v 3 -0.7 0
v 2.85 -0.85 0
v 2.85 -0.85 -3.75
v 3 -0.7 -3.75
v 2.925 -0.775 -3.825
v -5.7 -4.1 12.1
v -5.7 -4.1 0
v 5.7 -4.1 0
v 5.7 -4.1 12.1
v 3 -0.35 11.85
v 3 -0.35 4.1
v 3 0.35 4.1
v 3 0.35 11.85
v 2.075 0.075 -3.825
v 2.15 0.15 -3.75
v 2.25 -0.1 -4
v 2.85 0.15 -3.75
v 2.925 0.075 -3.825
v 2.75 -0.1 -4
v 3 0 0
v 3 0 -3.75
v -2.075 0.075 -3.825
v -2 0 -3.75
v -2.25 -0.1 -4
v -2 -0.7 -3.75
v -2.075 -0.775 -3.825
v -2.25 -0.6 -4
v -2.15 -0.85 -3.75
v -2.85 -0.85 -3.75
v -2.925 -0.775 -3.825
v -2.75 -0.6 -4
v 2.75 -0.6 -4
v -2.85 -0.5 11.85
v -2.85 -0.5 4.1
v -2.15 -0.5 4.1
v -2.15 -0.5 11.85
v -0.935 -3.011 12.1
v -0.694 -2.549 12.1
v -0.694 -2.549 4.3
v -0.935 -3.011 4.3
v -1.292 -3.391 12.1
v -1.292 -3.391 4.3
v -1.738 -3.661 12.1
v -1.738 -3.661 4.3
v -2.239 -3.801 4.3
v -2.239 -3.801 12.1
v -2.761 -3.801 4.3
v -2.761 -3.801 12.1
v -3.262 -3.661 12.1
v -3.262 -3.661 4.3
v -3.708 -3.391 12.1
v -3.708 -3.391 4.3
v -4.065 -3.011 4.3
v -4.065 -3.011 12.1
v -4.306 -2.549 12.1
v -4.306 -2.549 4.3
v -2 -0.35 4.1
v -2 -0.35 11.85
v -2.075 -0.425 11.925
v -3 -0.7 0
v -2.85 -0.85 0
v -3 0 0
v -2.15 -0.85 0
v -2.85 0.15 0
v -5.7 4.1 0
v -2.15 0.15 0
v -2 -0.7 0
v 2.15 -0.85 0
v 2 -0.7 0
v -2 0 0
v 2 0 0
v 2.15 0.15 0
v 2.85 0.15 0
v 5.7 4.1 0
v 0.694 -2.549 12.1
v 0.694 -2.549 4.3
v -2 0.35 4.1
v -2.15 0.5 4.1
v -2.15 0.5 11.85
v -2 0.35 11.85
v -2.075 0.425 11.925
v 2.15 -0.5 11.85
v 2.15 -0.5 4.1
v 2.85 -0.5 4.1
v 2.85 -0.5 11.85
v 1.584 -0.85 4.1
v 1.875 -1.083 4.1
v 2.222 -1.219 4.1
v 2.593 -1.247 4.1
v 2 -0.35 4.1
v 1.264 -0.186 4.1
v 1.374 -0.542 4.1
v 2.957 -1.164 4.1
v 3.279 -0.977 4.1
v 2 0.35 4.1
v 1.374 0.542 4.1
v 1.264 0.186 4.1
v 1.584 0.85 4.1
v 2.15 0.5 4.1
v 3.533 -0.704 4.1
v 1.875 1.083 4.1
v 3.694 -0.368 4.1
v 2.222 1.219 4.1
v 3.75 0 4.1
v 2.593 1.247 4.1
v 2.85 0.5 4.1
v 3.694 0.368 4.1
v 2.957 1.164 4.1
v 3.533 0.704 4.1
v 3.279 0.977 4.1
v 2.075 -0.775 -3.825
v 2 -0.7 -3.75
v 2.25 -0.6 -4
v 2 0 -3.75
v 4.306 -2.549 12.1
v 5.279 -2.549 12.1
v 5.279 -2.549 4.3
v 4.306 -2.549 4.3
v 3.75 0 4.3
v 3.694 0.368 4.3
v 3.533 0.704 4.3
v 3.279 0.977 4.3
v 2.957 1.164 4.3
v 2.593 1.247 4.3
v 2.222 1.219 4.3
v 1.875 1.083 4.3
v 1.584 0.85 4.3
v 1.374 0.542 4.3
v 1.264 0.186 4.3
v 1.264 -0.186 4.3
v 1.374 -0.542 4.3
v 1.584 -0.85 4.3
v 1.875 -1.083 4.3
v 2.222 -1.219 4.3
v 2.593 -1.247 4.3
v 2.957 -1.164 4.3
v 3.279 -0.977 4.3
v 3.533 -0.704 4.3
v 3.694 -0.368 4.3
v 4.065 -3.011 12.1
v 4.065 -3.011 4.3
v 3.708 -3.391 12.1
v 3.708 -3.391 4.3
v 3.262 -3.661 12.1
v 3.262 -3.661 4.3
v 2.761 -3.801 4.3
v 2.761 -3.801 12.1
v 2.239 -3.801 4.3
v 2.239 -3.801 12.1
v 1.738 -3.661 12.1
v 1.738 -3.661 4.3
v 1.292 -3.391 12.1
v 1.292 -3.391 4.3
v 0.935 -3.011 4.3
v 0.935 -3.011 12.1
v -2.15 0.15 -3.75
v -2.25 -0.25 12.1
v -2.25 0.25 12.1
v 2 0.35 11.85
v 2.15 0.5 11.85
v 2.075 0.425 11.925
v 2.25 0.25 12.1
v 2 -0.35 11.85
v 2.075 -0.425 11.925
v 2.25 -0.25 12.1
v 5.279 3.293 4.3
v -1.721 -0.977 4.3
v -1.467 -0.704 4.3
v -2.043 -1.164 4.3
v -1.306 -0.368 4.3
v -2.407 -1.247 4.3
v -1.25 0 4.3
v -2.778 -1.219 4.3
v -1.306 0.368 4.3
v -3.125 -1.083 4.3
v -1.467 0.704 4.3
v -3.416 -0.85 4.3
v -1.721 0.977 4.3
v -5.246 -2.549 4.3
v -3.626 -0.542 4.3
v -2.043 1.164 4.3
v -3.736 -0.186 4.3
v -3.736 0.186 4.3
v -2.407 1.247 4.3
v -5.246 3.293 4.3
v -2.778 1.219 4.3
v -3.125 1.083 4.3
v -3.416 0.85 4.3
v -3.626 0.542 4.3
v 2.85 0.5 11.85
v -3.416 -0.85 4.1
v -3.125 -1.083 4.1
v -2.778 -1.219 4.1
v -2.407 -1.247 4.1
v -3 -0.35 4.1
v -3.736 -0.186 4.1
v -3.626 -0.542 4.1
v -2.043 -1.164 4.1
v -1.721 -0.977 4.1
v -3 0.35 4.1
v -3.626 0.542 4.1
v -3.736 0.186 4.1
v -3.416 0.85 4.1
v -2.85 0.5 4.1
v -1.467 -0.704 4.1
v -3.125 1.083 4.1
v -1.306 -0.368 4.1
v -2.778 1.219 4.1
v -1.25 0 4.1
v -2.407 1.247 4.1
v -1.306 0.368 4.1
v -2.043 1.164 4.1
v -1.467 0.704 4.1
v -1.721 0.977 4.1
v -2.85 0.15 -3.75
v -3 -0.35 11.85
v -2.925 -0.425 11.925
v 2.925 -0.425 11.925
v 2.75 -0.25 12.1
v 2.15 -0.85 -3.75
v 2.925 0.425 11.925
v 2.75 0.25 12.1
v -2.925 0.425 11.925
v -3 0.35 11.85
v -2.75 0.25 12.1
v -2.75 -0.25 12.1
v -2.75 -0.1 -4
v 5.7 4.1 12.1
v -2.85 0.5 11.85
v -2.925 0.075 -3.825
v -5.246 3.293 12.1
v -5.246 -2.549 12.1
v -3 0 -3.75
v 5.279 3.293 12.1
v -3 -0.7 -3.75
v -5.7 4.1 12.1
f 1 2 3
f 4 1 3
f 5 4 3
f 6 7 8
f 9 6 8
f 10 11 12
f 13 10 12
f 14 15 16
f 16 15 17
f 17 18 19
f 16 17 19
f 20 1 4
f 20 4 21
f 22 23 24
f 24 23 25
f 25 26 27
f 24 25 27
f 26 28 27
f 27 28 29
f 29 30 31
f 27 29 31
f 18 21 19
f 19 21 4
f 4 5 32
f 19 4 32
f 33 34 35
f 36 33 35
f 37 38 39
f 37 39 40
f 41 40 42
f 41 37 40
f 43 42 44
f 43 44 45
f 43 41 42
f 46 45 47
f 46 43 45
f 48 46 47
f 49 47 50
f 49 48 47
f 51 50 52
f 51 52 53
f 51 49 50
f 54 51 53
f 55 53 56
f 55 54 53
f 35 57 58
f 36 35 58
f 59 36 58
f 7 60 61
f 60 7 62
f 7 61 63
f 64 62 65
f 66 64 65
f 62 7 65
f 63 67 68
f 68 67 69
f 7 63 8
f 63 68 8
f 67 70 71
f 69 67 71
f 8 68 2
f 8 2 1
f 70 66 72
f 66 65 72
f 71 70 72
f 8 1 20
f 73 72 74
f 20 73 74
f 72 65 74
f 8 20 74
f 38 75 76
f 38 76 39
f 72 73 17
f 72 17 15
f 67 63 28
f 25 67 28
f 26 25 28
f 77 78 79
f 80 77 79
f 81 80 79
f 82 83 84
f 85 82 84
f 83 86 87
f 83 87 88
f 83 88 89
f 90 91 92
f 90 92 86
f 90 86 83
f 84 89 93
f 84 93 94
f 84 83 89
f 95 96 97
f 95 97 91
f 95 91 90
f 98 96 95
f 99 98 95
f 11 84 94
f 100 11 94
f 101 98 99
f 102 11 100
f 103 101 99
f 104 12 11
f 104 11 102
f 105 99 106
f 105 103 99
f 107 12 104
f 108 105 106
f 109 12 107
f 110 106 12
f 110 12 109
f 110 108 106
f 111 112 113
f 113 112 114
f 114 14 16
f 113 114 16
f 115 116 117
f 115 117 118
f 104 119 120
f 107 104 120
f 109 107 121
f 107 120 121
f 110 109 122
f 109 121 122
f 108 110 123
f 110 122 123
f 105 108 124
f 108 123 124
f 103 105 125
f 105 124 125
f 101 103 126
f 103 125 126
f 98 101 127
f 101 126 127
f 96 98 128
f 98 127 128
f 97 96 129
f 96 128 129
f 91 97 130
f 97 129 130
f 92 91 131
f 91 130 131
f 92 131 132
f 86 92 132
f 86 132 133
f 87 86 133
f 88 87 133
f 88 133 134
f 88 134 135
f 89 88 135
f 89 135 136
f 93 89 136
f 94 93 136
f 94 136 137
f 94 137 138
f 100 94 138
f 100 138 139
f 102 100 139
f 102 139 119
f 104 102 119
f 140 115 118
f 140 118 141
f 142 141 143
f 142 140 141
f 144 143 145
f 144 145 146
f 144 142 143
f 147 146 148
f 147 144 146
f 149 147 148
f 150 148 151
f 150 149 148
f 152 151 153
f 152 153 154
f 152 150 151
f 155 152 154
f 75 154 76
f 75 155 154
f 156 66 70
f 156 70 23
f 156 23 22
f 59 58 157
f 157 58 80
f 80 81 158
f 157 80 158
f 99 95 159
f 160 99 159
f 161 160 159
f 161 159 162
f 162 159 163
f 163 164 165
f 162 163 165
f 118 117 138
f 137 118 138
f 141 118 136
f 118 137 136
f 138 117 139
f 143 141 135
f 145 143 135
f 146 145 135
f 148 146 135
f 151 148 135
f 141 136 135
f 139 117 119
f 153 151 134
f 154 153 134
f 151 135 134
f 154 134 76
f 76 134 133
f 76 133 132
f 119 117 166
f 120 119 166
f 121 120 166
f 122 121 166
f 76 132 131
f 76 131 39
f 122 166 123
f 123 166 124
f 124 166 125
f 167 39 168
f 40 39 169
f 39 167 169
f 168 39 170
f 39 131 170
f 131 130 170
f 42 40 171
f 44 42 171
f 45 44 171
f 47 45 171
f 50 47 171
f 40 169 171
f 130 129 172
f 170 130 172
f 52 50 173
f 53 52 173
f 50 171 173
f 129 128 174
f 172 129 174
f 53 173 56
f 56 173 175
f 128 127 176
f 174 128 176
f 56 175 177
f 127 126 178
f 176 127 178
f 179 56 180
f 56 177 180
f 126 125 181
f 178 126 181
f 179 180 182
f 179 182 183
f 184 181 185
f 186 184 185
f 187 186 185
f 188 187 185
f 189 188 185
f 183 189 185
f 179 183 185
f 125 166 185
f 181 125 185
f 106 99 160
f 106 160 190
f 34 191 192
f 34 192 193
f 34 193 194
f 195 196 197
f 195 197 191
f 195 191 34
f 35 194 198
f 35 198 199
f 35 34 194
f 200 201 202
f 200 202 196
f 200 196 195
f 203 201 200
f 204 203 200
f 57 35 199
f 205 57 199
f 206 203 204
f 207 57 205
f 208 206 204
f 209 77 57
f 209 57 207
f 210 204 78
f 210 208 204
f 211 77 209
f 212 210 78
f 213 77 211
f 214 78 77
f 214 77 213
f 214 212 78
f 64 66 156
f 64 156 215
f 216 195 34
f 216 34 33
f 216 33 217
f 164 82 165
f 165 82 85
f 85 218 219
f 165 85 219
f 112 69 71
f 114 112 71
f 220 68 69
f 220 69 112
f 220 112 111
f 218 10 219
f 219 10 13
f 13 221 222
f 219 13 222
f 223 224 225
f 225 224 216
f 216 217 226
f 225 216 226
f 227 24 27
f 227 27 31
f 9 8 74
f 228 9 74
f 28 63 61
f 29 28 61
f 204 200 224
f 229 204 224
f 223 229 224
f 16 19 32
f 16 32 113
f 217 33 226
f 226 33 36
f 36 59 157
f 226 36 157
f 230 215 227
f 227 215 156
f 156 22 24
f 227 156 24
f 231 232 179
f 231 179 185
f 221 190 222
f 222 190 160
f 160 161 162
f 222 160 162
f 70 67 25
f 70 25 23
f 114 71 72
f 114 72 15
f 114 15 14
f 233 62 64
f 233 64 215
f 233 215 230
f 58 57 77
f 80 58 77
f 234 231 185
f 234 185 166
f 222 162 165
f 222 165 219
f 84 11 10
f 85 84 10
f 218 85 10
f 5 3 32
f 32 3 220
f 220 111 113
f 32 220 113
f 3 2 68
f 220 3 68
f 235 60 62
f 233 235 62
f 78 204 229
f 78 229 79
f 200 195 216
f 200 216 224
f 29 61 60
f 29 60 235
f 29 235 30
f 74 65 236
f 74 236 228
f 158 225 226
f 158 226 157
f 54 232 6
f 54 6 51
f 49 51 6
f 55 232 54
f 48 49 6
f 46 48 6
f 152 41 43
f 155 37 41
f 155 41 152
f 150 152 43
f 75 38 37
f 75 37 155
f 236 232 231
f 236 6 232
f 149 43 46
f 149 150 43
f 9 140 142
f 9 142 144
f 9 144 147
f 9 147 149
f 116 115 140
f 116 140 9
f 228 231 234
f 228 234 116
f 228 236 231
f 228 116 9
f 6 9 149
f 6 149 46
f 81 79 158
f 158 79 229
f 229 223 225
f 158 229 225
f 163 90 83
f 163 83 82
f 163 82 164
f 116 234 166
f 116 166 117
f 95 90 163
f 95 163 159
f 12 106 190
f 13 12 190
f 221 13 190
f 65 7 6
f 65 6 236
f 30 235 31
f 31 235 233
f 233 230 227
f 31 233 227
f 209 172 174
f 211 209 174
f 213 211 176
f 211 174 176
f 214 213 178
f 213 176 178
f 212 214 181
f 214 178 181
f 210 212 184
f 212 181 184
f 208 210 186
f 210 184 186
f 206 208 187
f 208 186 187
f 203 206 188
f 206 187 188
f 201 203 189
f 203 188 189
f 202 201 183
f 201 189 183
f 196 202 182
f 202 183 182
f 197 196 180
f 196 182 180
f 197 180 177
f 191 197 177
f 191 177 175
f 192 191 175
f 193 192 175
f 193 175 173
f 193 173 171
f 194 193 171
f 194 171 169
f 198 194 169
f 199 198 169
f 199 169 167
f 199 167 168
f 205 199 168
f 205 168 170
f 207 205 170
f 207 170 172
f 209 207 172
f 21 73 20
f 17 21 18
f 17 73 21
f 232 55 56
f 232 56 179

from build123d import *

# Parameters (mm, degrees)
SKETCH_1_W          = 11.4
SKETCH_1_H          = 8.2
EXTRUDE_1_DEPTH     = 12.1
SKETCH_4_R          = 1.25
CUT_EXTRUDE_3_DEPTH = 8
CUT_EXTRUDE_4_DEPTH = 7.8
SKETCH_7_W          = 1
SKETCH_7_H          = 1
EXTRUDE_2_DEPTH     = 8
CHAMFER_1_SIZE      = 0.15
CHAMFER_2_SIZE      = 0.25
SKETCH_9_W          = 1
SKETCH_9_H          = 1
EXTRUDE_4_DEPTH     = 4
CHAMFER_5_SIZE      = 0.15
CHAMFER_6_SIZE      = 0.25


with BuildPart() as part:
    # Эскиз1 → Бобышка-Вытянуть1 (new body)
    with BuildSketch(Plane.XY):
        Rectangle(SKETCH_1_W, SKETCH_1_H)
    extrude(amount=EXTRUDE_1_DEPTH)

    # Эскиз4 → Вырез-Вытянуть3 (cut)
    with BuildSketch(Plane.XY.offset(12.1)):
        with Locations((-2.5, 0)):
            Circle(SKETCH_4_R)
        with Locations((2.5, 0)):
            Circle(SKETCH_4_R)
    extrude(amount=-CUT_EXTRUDE_3_DEPTH, mode=Mode.SUBTRACT)

    # Эскиз5 → Вырез-Вытянуть4 (cut)
    with BuildSketch(Plane.XY.offset(12.1)):
        with BuildLine():
            Line((-5.245621634, 0), (-5.245621634, 3.292901982))
            Line((-5.245621634, 3.292901982), (5.278509544, 3.292901982))
            Line((5.278509544, 3.292901982), (5.278509544, -2.548957219))
            Line((5.278509544, -2.548957219), (4.30582632, -2.548957219))
            ThreePointArc((4.30582632, -2.548957219), (2.5, -3.818893996), (0.69417368, -2.548957219))
            Line((0.69417368, -2.548957219), (-0.69417368, -2.548957219))
            ThreePointArc((-0.69417368, -2.548957219), (-2.5, -3.818893996), (-4.30582632, -2.548957219))
            Line((-4.30582632, -2.548957219), (-5.245621634, -2.548957219))
            Line((-5.245621634, -2.548957219), (-5.245621634, 0))
        make_face()
    extrude(amount=-CUT_EXTRUDE_4_DEPTH, mode=Mode.SUBTRACT)

    # Эскиз7 → Бобышка-Вытянуть2 (add)
    with BuildSketch(Plane.XY.offset(4.1)):
        with Locations((2.5, 0)):
            Rectangle(SKETCH_7_W, SKETCH_7_H)
        with Locations((-2.5, 0)):
            Rectangle(SKETCH_7_W, SKETCH_7_H)
    extrude(amount=EXTRUDE_2_DEPTH)

    # Фаска1
    chamfer_1_edges = [part.edges().sort_by_distance(p)[0] for p in [
        (-2, -0.5, 8.1),
        (-2, 0.5, 8.1),
        (-3, 0.5, 8.1),
        (-3, -0.5, 8.1),
        (3, -0.5, 8.1),
        (3, 0.5, 8.1),
        (2, 0.5, 8.1),
        (2, -0.5, 8.1),
    ]]
    chamfer(chamfer_1_edges, length=CHAMFER_1_SIZE)

    # Фаска2
    # the kernel refuses this chamfer: 0.25 mm, written as the material it takes off along each edge
    with BuildSketch(Plane(origin=(2, -0.992920747, 12.1), x_dir=(-0.027495876610586414, 0, -0.9996219169112968), z_dir=(0, 1, 0)), Plane(origin=(1.507079253, 0.5, 12.1), x_dir=(0, 0.027495876610586414, -0.9996219169112968), z_dir=(1, 0, 0)), Plane(origin=(3, 0.992920747, 12.1), x_dir=(0.02749587661058555, 0, -0.9996219169112968), z_dir=(0, -1, 0)), Plane(origin=(3.492920747, -0.5, 12.1), x_dir=(0, -0.027495876610586414, -0.9996219169112968), z_dir=(-1, 0, 0)), Plane(origin=(-2, 0.992920747, 12.1), x_dir=(0.027495876610586414, 0, -0.9996219169112968), z_dir=(0, -1, 0)), Plane(origin=(-1.507079253, -0.5, 12.1), x_dir=(0, -0.027495876610586414, -0.9996219169112968), z_dir=(-1, 0, 0)), Plane(origin=(-3, -0.992920747, 12.1), x_dir=(-0.02749587661058555, 0, -0.9996219169112968), z_dir=(0, 1, 0)), Plane(origin=(-3.492920747, 0.5, 12.1), x_dir=(0, 0.027495876610586414, -0.9996219169112968), z_dir=(1, 0, 0))) as chamfer_2_piece_1:
        Polygon((CHAMFER_2_SIZE * 0.999621916911, -CHAMFER_2_SIZE * 0.0274958766106), (-CHAMFER_2_SIZE * 0.0274958766106, -CHAMFER_2_SIZE * 0.999621916911), (0, 0), align=None)
    extrude(amount=1.985841494, mode=Mode.SUBTRACT)

    # Эскиз9 → Бобышка-Вытянуть4 (add)
    with BuildSketch(Plane(origin=(0, 0, 0), x_dir=(-1, 0, 0), z_dir=(0, 0, -1))):
        with Locations((2.5, -0.35)):
            Rectangle(SKETCH_9_W, SKETCH_9_H)
        with Locations((-2.5, -0.35)):
            Rectangle(SKETCH_9_W, SKETCH_9_H)
    extrude(amount=EXTRUDE_4_DEPTH)

    # Фаска5
    chamfer_5_edges = [part.edges().sort_by_distance(p)[0] for p in [
        (2, -0.85, -2),
        (2, 0.15, -2),
        (3, 0.15, -2),
        (3, -0.85, -2),
        (-3, -0.85, -2),
        (-3, 0.15, -2),
        (-2, 0.15, -2),
        (-2, -0.85, -2),
    ]]
    chamfer(chamfer_5_edges, length=CHAMFER_5_SIZE)

    # Фаска6
    # the kernel refuses this chamfer: 0.25 mm, written as the material it takes off along each edge
    with BuildSketch(Plane(origin=(-3.492920747, -0.85, -4), x_dir=(0, -0.02749587661058651, 0.9996219169112968), z_dir=(1, 0, 0)), Plane(origin=(1.507079253, -0.85, -4), x_dir=(0, -0.02749587661058651, 0.9996219169112968), z_dir=(1, 0, 0)), Plane(origin=(3, -1.342920747, -4), x_dir=(0.027495876610585647, 0, 0.9996219169112968), z_dir=(0, 1, 0)), Plane(origin=(2, 0.642920747, -4), x_dir=(-0.02749587661058651, 0, 0.9996219169112968), z_dir=(0, -1, 0)), Plane(origin=(-2, -1.342920747, -4), x_dir=(0.02749587661058651, 0, 0.9996219169112968), z_dir=(0, 1, 0)), Plane(origin=(-3, 0.642920747, -4), x_dir=(-0.027495876610585647, 0, 0.9996219169112968), z_dir=(0, -1, 0)), Plane(origin=(-1.507079253, 0.15, -4), x_dir=(0, 0.027495876610586403, 0.9996219169112968), z_dir=(-1, 0, 0)), Plane(origin=(3.492920747, 0.15, -4), x_dir=(0, 0.027495876610586403, 0.9996219169112968), z_dir=(-1, 0, 0))) as chamfer_6_piece_1:
        Polygon((CHAMFER_6_SIZE * 0.999621916911, -CHAMFER_6_SIZE * 0.0274958766106), (-CHAMFER_6_SIZE * 0.0274958766106, -CHAMFER_6_SIZE * 0.999621916911), (0, 0), align=None)
    extrude(amount=1.985841494, mode=Mode.SUBTRACT)


solid = part.part
